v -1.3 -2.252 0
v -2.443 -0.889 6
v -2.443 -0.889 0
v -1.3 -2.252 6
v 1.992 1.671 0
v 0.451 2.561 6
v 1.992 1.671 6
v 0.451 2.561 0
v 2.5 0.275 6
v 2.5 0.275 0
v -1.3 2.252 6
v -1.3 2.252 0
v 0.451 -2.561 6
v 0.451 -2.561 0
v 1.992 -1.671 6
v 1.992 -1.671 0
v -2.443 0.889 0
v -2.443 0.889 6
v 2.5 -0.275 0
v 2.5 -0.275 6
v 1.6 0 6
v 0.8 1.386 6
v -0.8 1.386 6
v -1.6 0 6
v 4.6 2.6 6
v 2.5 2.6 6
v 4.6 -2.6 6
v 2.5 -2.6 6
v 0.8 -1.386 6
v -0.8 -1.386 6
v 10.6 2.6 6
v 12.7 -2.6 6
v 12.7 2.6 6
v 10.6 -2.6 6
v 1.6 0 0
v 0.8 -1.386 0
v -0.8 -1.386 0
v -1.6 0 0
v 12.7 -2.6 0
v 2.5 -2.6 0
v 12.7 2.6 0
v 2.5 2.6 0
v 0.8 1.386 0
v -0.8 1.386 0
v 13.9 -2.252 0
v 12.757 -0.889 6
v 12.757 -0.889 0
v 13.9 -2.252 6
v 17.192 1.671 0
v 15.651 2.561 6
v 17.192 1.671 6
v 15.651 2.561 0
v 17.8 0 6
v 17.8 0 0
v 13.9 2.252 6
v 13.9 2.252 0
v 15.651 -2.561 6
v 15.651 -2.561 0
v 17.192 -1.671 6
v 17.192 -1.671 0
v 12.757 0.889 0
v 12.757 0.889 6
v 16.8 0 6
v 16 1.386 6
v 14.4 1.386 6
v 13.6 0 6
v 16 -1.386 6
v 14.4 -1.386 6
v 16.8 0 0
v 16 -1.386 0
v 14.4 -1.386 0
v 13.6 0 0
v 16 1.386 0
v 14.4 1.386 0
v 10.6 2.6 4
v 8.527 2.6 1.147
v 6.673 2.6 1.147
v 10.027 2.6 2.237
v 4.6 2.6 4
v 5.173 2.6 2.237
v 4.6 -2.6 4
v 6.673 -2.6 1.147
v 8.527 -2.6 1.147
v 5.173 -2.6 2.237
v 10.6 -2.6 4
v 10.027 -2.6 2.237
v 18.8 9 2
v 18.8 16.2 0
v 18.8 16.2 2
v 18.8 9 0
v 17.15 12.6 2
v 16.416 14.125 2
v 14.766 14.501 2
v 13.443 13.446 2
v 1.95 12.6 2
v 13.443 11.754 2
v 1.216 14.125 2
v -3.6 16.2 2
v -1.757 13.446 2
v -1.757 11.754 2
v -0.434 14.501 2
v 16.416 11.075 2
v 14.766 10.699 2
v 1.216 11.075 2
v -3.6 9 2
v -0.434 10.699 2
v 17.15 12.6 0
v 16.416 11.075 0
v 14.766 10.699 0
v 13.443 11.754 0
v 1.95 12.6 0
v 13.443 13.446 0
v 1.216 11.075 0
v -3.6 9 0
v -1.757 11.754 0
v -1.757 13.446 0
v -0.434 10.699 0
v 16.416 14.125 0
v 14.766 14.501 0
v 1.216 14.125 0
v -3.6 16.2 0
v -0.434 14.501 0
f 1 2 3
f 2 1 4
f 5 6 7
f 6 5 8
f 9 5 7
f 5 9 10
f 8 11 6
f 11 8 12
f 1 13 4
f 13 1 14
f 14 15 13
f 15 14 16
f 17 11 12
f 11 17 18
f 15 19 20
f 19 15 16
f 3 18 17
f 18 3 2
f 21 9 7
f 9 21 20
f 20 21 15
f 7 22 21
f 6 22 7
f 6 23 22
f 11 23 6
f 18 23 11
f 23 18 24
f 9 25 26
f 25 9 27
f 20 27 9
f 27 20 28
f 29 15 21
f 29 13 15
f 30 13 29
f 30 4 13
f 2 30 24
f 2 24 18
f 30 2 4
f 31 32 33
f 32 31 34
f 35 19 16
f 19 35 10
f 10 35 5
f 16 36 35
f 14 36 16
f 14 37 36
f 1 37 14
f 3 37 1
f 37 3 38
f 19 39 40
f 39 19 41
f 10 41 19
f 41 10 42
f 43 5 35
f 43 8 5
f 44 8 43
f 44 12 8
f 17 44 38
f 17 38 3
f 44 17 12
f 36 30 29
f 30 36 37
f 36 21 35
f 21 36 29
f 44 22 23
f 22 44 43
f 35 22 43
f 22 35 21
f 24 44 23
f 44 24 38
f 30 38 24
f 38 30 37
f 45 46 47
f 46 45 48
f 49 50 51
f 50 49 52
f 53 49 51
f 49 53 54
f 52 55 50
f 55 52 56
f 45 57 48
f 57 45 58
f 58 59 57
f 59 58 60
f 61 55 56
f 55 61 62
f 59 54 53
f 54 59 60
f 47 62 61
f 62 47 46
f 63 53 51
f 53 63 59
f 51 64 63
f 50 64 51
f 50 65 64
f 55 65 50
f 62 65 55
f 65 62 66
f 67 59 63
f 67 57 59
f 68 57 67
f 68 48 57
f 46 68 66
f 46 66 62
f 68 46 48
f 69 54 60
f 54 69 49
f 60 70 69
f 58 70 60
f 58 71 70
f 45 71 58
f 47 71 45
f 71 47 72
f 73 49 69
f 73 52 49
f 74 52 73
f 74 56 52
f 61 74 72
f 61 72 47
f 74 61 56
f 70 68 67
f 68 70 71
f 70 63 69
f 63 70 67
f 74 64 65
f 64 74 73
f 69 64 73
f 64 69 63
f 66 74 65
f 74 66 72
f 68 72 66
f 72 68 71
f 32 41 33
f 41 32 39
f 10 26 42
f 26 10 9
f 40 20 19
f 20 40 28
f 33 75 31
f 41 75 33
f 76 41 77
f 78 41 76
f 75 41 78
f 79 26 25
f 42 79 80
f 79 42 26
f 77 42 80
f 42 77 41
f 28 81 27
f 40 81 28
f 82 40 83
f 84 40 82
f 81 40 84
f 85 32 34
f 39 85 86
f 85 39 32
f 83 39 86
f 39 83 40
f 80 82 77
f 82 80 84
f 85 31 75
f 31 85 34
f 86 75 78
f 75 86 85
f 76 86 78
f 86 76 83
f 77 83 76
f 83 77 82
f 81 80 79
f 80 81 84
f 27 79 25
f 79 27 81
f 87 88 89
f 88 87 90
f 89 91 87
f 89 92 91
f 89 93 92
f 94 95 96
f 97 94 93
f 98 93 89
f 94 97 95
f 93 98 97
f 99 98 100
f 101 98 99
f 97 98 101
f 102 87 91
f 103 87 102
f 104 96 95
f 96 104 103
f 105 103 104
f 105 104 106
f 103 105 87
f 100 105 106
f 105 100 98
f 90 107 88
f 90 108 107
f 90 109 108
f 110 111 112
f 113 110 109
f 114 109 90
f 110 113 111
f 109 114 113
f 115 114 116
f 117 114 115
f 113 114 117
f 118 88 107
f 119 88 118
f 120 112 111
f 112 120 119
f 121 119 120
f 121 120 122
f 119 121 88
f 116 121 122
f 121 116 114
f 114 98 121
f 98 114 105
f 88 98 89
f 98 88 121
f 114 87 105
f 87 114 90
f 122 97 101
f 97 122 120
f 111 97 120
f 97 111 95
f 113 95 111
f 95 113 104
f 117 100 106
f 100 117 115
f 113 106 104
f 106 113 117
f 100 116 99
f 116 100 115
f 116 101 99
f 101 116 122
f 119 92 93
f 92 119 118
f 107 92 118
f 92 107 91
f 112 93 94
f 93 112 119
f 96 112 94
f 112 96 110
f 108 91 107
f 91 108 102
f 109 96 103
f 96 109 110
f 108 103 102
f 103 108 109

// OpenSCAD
// file: SimpleStandoff.scad
module simpleStandoff(height) {
  mountingHoleDiameter = 3.2;
  difference() {
    cylinder(r=1 + mountingHoleDiameter/2, h = height);
    translate([0,0,-1]) cylinder(r=mountingHoleDiameter/2, h = height+2);    
  }
}


simpleStandoff(3, $fn=80);
// main file
use <SimpleStandoff.scad>

standoffD=3.2+2;
xT = 2.6;
holeD=3.9;
e=0.2;

module cable(cableD) {
  rotate([90,0,0]) cylinder(r=cableD/2,h=10);
}

module cableReleifBase(cableD) {
  difference() {
    union() {
      simpleStandoff(cableD);
      translate([cableD+standoffD+4,0,0]) simpleStandoff(cableD);
      translate([standoffD/2-e/2,-standoffD/2,0]) cube([cableD+4+e,standoffD,cableD]);
    }
    hull() {
      translate([(cableD+standoffD+4)/2,5,cableD/2+1]) cable(cableD);
      translate([(cableD+standoffD+4)/2,5,cableD/2+10]) cable(cableD);
    }
  }
}

module cableReleifHolder(cableD) {
  difference() {
    translate([-1,-1,0]) cube([cableD+2*standoffD+6,standoffD+2,2]);
    #translate([standoffD/2,standoffD/2,-1]) cylinder(r=holeD/2,h=10);
    #translate([cableD+2*standoffD+4-standoffD/2,standoffD/2,-1]) cylinder(r=holeD/2,h=10);
  }
}

cableReleifBase(cableD=6);

translate([-standoffD/2,10,0]) cableReleifHolder(cableD=6);
